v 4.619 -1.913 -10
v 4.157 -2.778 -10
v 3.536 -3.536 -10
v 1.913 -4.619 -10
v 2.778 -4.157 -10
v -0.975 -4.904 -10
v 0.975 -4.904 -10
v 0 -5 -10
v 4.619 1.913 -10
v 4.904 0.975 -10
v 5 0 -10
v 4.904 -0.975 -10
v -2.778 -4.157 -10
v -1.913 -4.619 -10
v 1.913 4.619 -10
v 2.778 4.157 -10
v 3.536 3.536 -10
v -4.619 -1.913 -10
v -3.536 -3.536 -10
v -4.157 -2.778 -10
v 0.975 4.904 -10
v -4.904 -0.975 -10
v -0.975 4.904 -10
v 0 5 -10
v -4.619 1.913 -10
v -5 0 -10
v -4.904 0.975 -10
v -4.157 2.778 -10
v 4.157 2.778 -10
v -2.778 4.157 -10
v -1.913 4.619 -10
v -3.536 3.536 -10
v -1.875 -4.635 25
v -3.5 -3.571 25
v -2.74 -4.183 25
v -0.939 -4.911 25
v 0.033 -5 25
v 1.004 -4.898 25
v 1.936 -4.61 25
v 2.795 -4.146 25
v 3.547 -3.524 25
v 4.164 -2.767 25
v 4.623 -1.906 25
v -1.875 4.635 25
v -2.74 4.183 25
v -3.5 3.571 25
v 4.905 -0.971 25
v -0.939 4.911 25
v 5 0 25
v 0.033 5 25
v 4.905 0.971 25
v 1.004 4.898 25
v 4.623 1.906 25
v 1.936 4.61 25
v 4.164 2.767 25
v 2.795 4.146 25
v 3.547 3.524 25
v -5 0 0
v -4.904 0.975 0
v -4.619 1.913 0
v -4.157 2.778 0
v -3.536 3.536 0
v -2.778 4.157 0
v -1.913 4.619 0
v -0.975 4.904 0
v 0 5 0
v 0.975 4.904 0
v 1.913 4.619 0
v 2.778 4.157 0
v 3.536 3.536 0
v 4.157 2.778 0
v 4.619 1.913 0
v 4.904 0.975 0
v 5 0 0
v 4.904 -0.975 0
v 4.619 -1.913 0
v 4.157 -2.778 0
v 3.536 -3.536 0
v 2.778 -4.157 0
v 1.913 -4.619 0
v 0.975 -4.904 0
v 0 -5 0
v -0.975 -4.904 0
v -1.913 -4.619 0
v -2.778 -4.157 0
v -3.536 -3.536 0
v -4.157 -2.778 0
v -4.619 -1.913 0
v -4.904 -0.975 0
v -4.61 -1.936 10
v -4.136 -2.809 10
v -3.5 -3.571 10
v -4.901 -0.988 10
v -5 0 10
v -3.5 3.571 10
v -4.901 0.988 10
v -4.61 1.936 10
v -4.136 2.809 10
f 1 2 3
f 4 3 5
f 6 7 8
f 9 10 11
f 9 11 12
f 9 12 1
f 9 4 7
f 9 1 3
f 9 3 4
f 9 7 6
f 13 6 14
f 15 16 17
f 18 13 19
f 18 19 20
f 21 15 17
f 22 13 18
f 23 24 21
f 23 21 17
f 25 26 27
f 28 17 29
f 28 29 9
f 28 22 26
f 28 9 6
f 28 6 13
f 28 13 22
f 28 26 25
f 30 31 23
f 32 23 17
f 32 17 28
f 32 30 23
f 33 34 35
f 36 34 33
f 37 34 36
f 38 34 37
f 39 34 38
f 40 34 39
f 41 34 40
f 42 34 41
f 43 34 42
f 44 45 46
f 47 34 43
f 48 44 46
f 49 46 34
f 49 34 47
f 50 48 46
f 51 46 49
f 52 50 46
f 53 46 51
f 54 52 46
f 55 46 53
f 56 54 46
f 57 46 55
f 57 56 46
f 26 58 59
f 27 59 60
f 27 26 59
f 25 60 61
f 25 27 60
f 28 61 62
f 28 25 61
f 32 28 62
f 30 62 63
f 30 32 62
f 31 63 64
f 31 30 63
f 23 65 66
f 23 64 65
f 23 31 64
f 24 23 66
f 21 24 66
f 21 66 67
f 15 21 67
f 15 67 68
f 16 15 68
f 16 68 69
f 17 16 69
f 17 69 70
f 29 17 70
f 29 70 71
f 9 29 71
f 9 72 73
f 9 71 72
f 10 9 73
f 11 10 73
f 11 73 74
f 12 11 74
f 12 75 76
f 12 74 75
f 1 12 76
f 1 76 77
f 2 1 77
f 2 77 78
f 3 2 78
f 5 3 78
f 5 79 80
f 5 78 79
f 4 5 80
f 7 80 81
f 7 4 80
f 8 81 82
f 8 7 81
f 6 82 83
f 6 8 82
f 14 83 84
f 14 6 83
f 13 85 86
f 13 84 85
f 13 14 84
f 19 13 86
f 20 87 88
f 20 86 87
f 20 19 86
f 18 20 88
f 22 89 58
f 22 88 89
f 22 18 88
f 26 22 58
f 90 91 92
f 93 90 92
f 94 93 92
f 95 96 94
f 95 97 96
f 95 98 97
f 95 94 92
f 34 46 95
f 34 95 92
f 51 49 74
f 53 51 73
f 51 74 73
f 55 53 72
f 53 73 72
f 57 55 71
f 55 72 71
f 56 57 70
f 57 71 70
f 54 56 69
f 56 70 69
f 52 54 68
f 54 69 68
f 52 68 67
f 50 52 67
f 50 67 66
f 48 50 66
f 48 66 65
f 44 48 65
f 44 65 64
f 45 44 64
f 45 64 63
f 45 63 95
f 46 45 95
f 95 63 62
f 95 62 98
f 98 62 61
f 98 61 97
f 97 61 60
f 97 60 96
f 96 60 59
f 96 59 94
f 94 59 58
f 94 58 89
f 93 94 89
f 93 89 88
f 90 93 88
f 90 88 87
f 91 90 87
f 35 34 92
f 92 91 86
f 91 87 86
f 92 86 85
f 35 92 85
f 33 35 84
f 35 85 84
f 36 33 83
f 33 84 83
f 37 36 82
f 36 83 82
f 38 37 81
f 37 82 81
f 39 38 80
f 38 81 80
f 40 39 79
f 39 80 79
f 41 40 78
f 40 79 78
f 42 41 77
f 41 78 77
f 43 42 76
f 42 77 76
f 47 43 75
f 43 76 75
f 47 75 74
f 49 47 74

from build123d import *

# Parameters (mm, degrees)
SKETCH_1_R          = 5
EXTRUDE_1_DEPTH     = 25
SKETCH_2_OUTSIDE_W  = 17.744
SKETCH_2_OUTSIDE_H  = 17.744
CUT_EXTRUDE_1_DEPTH = 15
EXTRUDE_START       = 10
SKETCH_3_R          = 5
EXTRUDE_2_DEPTH     = 10


with BuildPart() as part:
    # 스케치1 → 보스-돌출1 (new body)
    with BuildSketch(Plane.XY):
        Circle(SKETCH_1_R)
    extrude(amount=EXTRUDE_1_DEPTH)

    # 스케치2 outside → 컷-돌출1 (cut)
    with BuildSketch(Plane.XY.offset(25)):
        Rectangle(SKETCH_2_OUTSIDE_W, SKETCH_2_OUTSIDE_H)
        with BuildLine():
            Line((-3.5, 3.570714214), (-3.5, -3.570714214))
            ThreePointArc((-3.5, -3.570714214), (5, 0), (-3.5, 3.570714214))
        make_face(mode=Mode.SUBTRACT)
    extrude(amount=-CUT_EXTRUDE_1_DEPTH, mode=Mode.SUBTRACT)

    # 스케치3 → 보스-돌출2 (add)
    with BuildSketch(Plane(origin=(0, 0, 0), x_dir=(-1, 0, 0), z_dir=(0, 0, -1)).offset(EXTRUDE_START)):
        Circle(SKETCH_3_R)
    extrude(amount=-EXTRUDE_2_DEPTH)


solid = part.part
